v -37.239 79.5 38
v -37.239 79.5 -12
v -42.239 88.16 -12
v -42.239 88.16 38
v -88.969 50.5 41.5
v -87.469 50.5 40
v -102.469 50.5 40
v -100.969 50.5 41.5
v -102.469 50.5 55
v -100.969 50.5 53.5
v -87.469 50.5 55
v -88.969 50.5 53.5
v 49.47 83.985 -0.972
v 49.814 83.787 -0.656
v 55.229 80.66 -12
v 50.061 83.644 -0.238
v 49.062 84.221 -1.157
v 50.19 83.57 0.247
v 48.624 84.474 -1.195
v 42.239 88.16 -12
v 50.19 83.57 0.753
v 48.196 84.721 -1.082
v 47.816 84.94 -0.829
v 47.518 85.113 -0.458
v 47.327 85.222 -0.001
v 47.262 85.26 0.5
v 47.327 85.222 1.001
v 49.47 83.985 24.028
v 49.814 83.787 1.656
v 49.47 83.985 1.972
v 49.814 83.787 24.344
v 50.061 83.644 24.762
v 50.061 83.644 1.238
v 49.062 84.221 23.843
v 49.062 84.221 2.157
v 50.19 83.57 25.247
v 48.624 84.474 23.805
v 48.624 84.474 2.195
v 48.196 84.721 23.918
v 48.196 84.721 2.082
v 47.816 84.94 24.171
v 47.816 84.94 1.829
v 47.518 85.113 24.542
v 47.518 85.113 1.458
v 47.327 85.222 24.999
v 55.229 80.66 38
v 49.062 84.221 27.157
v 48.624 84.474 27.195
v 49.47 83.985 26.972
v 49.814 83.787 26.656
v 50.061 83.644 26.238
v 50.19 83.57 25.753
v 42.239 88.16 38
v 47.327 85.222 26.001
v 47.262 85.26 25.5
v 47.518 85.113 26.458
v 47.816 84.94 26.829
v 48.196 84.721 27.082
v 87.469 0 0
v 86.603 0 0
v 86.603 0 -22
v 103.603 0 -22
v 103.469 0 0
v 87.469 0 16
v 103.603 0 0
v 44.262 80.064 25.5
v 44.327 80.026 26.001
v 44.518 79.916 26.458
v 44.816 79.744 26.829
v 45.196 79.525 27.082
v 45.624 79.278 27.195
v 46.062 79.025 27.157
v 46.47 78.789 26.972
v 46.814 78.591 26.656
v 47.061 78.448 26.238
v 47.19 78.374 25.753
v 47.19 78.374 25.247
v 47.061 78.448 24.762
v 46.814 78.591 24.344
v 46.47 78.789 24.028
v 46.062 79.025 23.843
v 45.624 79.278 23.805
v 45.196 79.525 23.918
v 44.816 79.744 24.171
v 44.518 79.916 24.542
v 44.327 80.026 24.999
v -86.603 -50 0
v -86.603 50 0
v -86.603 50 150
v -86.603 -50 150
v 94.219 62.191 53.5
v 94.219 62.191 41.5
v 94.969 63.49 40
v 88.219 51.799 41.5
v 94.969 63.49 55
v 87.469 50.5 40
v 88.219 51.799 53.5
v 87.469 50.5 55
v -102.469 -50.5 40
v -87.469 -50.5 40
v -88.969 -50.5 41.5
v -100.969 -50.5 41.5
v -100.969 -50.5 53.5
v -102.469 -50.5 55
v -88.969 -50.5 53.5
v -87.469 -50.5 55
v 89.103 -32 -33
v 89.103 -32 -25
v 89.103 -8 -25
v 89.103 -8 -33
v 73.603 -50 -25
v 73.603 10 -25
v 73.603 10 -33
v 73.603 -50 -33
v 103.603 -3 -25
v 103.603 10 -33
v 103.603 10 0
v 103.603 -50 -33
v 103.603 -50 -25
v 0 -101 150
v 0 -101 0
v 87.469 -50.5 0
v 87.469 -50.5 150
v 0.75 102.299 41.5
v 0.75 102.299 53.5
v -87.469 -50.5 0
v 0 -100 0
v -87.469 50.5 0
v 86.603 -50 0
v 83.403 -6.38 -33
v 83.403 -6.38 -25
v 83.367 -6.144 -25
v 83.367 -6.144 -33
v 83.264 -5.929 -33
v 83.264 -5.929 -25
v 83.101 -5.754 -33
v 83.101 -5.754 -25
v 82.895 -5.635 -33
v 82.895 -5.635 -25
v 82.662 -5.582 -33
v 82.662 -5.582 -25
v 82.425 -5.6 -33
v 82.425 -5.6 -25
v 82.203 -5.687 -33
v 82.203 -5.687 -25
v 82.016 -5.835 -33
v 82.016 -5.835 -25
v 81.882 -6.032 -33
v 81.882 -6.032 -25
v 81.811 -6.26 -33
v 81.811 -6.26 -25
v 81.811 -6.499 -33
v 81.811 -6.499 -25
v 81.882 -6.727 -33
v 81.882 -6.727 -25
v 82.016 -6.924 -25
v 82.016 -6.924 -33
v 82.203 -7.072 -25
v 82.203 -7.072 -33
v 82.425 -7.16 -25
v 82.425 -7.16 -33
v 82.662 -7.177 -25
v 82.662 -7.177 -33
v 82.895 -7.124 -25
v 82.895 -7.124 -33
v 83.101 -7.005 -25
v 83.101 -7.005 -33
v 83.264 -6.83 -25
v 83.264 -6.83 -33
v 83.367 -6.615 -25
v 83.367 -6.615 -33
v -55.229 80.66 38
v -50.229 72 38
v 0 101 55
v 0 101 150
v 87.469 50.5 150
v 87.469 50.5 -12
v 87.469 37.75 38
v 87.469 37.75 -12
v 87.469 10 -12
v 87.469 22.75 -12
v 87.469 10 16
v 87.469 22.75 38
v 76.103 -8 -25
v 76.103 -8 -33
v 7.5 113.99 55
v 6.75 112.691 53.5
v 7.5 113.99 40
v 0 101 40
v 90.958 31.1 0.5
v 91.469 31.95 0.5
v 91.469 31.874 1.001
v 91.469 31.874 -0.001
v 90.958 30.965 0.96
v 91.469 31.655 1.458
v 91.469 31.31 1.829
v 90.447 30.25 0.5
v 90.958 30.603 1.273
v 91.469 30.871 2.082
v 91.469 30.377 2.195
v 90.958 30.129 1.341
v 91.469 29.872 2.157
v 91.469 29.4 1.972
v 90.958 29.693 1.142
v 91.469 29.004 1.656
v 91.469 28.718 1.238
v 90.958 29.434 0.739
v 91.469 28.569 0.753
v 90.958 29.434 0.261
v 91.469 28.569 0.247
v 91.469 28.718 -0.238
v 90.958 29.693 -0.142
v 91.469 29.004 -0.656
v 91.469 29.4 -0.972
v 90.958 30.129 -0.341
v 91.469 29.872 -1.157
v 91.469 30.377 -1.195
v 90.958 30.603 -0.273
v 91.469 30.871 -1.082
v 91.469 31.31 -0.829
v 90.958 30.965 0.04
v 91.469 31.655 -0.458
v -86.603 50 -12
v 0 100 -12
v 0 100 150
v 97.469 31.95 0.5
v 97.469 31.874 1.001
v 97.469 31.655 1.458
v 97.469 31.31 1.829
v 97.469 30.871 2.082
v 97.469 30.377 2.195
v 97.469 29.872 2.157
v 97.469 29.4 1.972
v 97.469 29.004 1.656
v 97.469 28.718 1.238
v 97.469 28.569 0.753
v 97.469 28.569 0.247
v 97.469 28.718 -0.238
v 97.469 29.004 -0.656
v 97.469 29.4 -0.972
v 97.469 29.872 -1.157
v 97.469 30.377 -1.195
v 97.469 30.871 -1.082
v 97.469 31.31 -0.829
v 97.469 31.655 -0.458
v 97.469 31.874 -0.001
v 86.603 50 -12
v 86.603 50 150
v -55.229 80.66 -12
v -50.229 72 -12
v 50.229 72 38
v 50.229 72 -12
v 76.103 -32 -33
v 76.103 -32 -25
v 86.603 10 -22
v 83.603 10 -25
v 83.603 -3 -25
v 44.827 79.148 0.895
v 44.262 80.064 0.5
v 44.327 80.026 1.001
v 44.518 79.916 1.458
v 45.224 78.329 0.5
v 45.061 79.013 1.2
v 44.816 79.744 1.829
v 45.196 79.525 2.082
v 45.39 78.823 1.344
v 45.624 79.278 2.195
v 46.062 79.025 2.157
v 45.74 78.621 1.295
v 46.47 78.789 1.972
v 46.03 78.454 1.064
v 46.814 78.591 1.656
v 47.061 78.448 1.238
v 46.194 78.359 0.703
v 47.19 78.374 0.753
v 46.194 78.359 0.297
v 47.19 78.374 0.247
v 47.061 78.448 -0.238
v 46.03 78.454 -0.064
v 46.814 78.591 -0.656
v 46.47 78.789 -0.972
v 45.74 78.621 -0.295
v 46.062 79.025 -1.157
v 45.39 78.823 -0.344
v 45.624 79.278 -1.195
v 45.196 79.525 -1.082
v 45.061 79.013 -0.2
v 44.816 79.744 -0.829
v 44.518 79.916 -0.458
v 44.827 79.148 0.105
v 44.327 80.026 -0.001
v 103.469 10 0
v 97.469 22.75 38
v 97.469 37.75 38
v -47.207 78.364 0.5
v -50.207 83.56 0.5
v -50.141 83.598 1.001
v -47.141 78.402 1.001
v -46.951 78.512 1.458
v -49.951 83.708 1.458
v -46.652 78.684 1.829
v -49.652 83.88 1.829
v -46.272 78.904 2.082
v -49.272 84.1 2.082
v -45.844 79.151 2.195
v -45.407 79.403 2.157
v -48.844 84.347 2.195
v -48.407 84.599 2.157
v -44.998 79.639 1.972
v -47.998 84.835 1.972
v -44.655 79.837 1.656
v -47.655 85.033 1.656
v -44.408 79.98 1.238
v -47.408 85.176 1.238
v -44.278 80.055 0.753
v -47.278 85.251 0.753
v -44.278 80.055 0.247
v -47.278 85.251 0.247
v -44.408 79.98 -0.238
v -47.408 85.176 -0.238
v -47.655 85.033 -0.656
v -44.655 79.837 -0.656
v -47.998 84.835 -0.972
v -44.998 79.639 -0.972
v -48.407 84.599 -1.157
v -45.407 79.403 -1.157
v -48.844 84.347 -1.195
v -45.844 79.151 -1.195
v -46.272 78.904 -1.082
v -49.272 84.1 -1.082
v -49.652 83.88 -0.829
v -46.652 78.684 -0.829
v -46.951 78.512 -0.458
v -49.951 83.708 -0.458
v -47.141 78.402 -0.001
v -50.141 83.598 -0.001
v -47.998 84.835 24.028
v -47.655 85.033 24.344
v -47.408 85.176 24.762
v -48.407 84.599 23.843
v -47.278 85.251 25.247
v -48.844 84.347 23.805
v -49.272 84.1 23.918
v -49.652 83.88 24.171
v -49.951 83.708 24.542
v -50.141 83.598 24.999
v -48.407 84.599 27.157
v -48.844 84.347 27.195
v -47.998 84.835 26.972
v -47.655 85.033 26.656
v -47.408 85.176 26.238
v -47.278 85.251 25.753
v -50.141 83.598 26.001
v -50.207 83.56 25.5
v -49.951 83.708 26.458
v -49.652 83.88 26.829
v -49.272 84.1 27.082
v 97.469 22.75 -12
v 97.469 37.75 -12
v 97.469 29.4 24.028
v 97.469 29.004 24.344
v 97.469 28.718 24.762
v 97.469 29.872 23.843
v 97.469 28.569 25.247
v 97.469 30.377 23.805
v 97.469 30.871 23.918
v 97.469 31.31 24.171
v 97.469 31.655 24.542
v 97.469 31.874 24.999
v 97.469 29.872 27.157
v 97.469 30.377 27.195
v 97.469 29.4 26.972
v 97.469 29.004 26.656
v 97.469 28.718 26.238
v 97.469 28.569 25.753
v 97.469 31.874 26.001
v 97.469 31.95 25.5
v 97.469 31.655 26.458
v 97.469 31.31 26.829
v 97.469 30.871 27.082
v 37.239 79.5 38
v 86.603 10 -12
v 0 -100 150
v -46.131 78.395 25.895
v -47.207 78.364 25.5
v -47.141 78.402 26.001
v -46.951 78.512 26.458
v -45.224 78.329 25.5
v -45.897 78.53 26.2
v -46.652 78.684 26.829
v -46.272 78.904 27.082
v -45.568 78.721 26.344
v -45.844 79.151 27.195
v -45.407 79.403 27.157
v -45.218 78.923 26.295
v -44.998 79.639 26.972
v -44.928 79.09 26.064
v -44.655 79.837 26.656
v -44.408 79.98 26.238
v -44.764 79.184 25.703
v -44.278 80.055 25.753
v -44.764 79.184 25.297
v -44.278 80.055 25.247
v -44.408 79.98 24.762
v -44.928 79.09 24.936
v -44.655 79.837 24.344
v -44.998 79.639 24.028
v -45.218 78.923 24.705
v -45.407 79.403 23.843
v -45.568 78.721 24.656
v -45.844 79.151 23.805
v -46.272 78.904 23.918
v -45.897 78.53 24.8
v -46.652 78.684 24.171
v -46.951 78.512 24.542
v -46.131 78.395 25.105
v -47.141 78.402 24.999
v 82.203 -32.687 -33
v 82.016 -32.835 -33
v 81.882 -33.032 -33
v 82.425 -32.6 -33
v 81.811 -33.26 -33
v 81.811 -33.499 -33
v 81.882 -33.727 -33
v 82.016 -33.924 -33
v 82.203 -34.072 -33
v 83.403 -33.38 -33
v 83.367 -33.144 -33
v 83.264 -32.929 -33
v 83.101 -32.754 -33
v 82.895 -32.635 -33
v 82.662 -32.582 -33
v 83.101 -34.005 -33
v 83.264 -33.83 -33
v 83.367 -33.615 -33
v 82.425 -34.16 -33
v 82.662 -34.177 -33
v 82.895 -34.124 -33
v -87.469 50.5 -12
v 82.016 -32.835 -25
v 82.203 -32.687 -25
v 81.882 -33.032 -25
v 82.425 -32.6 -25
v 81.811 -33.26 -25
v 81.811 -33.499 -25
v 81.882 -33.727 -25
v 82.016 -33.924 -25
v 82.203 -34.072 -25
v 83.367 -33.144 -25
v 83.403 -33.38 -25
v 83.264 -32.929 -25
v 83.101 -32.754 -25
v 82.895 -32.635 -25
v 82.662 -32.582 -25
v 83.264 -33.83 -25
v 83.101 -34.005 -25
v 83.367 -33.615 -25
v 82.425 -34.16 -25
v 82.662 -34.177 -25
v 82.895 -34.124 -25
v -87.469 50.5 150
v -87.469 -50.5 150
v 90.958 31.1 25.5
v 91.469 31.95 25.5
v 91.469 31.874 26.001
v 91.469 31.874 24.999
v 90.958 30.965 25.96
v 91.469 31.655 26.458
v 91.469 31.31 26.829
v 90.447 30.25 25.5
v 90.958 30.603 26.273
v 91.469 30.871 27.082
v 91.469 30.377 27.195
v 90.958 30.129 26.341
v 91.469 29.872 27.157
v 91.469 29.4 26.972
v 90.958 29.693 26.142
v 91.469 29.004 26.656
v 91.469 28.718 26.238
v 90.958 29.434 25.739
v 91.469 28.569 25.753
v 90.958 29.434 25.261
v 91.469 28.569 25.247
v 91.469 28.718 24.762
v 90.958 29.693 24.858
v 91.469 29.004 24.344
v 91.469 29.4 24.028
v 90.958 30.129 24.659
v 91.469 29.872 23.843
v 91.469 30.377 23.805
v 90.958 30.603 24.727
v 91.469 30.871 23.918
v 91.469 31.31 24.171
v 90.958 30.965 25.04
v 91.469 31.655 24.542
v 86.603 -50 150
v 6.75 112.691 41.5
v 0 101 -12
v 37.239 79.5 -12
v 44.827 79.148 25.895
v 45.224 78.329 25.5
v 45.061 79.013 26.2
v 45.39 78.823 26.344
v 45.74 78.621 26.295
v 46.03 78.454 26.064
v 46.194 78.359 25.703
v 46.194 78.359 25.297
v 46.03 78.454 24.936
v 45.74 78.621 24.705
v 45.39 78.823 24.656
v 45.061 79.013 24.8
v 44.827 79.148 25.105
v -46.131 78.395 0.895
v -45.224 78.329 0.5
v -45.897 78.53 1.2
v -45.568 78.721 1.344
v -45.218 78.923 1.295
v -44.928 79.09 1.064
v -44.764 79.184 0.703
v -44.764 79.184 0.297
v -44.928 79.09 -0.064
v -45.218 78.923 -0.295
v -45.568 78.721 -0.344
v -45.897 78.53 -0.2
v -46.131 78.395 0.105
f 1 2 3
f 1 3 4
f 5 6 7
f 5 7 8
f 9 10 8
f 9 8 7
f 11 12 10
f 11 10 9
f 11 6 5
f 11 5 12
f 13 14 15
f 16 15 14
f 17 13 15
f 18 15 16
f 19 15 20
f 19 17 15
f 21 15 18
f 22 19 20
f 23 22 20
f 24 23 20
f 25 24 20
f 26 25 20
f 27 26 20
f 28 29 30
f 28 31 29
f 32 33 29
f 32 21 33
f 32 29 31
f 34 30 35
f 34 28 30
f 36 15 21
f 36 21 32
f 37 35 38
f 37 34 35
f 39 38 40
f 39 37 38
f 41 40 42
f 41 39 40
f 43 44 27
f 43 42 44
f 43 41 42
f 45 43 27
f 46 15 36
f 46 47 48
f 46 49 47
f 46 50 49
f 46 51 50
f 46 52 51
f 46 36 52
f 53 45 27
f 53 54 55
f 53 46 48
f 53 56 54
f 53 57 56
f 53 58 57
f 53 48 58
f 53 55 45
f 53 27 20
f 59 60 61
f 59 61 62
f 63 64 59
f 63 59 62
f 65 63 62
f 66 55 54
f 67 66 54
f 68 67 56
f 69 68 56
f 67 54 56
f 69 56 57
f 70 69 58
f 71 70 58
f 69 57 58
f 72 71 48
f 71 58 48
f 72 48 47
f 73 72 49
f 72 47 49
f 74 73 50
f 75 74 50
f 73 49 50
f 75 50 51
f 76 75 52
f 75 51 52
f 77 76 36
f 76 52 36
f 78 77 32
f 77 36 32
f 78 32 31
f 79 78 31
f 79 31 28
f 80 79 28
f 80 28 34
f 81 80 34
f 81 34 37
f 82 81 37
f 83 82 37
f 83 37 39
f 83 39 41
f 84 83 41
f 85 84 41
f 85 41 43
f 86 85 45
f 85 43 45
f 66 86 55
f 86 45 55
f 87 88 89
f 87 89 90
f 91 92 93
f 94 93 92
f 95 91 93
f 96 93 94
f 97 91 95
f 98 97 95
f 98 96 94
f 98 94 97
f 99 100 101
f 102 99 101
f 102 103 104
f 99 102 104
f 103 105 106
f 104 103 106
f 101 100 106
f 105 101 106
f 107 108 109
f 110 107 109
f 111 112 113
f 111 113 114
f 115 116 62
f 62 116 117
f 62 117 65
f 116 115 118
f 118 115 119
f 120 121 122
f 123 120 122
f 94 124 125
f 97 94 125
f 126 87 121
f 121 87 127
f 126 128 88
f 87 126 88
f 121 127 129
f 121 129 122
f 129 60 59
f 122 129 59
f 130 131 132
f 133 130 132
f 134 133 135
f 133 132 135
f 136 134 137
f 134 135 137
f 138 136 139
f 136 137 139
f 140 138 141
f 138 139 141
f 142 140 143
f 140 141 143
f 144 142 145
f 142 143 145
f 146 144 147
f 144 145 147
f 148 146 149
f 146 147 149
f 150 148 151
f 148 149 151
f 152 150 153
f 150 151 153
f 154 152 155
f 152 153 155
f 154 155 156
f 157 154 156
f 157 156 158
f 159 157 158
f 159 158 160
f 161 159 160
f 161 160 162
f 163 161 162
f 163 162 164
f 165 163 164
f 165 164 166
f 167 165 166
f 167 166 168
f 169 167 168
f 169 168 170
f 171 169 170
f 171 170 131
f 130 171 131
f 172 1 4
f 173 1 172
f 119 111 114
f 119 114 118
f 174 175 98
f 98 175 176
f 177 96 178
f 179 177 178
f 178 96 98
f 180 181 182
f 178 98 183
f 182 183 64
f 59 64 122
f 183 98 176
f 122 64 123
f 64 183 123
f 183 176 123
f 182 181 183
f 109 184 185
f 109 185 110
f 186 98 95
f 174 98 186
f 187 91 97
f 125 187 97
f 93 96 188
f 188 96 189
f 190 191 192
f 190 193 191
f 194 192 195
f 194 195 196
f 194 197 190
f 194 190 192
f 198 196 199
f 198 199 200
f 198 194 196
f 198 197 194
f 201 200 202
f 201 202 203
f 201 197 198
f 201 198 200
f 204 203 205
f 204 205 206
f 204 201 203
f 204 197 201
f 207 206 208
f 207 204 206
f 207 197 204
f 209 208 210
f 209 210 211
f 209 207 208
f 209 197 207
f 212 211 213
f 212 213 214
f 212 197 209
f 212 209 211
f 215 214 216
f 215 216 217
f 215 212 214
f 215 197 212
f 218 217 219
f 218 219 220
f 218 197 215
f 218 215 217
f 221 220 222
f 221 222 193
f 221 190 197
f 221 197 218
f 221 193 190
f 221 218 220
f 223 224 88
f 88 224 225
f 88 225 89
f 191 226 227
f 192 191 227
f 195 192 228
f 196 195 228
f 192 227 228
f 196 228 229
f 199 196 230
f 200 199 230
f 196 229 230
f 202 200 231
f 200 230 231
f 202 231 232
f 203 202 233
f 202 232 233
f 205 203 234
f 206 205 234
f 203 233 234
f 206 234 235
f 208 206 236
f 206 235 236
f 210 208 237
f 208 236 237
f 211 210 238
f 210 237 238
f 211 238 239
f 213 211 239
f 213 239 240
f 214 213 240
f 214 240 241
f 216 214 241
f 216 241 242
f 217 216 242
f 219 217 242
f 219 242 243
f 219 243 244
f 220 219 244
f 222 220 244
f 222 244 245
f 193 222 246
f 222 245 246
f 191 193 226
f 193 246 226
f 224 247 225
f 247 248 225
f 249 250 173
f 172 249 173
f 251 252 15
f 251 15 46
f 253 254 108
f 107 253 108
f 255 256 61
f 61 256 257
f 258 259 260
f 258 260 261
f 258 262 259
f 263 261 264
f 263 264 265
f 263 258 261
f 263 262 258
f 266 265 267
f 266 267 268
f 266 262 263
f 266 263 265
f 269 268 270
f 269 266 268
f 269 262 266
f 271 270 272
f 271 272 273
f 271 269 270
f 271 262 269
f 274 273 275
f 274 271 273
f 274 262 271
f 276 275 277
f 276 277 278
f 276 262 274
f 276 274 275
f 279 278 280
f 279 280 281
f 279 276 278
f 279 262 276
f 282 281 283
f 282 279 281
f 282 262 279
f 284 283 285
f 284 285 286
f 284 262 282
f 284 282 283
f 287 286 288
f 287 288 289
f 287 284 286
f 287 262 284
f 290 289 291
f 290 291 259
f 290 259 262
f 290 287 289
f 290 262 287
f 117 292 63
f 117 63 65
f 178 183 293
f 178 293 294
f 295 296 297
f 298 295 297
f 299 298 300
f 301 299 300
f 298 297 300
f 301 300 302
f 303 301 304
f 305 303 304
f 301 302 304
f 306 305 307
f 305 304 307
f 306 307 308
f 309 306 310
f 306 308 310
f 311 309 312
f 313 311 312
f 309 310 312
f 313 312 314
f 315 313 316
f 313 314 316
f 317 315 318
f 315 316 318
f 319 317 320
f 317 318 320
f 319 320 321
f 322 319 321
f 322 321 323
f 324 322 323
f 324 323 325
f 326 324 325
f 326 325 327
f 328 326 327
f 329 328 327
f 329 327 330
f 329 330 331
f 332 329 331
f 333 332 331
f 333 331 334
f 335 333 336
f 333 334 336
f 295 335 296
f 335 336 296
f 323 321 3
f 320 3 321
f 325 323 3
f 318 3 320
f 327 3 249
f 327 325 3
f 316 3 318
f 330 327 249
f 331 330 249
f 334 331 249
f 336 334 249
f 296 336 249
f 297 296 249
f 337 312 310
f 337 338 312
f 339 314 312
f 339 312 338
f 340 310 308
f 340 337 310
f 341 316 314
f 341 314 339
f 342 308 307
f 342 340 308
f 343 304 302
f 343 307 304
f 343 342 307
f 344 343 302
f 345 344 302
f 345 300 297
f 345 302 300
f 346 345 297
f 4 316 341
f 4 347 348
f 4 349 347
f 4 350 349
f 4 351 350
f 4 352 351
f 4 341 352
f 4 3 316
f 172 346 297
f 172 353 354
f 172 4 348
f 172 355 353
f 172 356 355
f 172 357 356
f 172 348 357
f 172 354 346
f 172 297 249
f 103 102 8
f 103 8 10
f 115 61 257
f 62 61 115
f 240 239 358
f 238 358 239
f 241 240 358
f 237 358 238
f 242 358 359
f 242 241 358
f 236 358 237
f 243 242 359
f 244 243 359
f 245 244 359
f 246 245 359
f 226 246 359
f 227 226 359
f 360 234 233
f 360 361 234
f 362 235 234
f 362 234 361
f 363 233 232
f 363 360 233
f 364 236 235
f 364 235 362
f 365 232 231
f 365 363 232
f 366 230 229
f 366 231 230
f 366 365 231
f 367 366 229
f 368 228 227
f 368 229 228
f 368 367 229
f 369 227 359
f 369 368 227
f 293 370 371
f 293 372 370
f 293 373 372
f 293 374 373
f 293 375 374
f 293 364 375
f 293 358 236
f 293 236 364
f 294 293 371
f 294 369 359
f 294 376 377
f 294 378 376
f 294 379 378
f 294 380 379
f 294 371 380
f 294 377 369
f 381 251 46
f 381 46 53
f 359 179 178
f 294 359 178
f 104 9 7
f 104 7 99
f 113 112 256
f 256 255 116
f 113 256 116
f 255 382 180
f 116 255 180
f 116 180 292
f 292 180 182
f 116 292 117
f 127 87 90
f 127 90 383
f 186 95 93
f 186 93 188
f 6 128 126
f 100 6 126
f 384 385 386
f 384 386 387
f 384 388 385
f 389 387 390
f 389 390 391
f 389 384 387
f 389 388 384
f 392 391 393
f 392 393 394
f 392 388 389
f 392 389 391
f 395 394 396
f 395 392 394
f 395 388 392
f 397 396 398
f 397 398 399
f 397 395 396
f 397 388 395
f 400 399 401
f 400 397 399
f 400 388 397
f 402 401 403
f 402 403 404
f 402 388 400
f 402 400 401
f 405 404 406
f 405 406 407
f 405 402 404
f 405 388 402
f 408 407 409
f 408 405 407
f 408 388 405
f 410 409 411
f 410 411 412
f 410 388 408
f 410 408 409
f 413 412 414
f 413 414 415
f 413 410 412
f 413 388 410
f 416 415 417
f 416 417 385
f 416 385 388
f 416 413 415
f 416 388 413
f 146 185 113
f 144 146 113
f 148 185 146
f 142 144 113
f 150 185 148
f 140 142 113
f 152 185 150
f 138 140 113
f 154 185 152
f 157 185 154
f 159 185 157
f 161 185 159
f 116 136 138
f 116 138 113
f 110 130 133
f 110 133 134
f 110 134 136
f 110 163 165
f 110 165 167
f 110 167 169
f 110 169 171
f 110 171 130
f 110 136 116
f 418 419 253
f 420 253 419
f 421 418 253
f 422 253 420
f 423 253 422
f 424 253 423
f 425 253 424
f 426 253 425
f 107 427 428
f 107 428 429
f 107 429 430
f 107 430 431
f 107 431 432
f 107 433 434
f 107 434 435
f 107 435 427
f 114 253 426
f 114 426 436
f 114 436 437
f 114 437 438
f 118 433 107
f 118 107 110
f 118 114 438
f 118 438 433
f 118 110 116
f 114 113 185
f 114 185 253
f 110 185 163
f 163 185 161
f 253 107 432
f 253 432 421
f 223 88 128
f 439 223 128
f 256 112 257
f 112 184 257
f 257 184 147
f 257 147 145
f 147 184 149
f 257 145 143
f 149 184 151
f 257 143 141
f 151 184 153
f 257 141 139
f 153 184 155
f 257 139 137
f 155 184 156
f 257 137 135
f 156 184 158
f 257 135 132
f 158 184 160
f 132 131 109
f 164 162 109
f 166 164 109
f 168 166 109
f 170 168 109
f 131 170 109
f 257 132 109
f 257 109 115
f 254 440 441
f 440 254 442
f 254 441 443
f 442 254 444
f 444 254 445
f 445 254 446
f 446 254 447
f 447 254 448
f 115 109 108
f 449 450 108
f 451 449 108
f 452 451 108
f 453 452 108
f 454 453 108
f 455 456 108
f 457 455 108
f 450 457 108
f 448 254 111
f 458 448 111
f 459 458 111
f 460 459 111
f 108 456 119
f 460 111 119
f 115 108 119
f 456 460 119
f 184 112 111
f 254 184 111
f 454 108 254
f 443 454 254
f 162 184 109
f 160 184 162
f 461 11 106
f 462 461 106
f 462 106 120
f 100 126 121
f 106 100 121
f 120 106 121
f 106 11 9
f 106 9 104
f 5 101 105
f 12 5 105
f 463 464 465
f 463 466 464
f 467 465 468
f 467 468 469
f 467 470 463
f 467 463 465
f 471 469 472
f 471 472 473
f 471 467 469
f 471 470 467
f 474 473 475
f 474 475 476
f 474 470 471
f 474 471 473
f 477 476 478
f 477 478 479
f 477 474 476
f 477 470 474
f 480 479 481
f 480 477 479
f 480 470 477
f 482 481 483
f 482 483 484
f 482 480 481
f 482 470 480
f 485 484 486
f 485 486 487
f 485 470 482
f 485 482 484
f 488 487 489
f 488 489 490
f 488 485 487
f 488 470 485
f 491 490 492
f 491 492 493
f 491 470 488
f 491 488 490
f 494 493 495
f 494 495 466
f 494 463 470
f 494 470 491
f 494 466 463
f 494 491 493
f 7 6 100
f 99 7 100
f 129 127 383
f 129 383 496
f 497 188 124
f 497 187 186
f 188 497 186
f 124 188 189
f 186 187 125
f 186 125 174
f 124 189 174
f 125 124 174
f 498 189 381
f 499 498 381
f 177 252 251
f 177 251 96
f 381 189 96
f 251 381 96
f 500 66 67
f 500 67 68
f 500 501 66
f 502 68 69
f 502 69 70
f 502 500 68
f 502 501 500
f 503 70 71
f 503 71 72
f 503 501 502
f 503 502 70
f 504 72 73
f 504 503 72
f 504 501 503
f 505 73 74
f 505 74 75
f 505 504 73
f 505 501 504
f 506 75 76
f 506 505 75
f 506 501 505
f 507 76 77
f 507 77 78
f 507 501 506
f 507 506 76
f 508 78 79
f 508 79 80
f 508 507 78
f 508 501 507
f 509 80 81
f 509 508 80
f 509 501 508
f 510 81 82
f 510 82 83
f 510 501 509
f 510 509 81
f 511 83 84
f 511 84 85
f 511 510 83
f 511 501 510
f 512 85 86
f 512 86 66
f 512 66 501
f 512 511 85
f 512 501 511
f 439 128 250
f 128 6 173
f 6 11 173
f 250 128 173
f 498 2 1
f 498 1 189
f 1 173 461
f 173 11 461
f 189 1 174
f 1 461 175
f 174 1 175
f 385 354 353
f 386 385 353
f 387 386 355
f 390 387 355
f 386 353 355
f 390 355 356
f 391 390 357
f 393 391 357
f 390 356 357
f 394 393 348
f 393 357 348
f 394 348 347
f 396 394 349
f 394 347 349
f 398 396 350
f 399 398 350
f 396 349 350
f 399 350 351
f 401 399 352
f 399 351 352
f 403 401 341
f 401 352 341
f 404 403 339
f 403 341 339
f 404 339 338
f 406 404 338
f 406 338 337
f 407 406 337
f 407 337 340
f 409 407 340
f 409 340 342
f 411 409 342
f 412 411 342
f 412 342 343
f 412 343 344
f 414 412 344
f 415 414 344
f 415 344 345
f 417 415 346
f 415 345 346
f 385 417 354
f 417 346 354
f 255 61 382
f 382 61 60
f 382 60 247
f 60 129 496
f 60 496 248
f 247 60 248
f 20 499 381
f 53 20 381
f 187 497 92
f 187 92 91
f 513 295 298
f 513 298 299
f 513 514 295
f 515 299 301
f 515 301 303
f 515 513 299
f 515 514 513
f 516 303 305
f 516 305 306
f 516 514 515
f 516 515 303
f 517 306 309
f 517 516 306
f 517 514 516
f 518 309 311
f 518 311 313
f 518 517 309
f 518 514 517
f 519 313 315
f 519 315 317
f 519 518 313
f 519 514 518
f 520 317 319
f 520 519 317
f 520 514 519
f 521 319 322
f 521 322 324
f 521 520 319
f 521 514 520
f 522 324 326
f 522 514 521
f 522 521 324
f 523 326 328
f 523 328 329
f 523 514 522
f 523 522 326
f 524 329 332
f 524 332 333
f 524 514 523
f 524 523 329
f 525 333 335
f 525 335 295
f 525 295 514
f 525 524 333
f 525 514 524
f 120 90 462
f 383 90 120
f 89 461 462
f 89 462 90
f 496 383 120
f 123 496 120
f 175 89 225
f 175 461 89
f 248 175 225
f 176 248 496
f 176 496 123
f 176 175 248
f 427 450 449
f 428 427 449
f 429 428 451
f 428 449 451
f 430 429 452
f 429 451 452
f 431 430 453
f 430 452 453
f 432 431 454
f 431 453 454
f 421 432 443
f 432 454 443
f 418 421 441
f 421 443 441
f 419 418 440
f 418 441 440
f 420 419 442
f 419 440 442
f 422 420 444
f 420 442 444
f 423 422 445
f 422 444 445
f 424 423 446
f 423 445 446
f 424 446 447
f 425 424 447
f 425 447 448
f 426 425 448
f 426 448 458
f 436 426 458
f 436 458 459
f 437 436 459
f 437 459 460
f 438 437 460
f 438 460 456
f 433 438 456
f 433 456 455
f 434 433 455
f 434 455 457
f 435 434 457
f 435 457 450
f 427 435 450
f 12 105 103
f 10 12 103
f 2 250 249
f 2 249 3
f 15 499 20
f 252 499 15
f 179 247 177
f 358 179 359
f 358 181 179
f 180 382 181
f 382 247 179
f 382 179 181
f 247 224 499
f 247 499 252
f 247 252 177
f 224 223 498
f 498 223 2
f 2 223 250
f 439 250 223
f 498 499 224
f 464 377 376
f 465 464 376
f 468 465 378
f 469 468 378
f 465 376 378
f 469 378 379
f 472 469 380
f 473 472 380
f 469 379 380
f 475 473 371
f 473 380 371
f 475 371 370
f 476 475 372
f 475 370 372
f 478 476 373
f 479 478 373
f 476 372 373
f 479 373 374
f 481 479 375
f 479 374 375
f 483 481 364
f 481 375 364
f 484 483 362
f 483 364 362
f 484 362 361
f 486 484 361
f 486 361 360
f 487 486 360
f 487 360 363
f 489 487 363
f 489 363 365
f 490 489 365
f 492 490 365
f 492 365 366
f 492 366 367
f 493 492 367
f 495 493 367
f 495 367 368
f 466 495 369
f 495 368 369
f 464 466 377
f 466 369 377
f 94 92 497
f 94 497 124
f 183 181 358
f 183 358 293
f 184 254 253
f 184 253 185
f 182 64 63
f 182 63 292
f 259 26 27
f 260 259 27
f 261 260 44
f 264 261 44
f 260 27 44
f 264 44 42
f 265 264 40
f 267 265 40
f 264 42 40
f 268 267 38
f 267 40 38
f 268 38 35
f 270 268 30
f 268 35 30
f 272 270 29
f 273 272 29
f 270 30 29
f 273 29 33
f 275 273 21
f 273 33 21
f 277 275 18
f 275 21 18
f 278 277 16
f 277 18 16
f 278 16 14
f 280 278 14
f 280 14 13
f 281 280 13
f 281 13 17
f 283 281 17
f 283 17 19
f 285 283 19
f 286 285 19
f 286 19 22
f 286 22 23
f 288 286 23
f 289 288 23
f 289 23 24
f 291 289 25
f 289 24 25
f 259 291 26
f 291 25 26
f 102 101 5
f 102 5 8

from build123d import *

# Parameters (mm, degrees)
PAD_DEPTH       = 150
SKETCH001_W     = 17
SKETCH001_H     = 10
PAD001_DEPTH    = 25
SKETCH002_W     = 30
SKETCH002_H     = 60
PAD002_DEPTH    = 8
SKETCH003_W     = 13
SKETCH003_H     = 24
POCKET_DEPTH    = 8.001
SKETCH004_R     = 0.8
HOLE_DEPTH      = 25
CHAMFER_SIZE    = 16
CHAMFER001_SIZE = 3
PAD003_DEPTH    = 12
SKETCH006_W     = 15
SKETCH006_H     = 50
PAD004_DEPTH    = 10
SKETCH007_R     = 1.7
HOLE001_DEPTH   = 6
HOLE001_TIPS_R  = 1.7
SKETCH008_W     = 15
SKETCH008_H     = 50
PAD005_DEPTH    = 10
SKETCH009_R     = 1.7
HOLE002_DEPTH   = 6
HOLE002_TIPS_R  = 1.7
SKETCH010_W     = 15
SKETCH010_H     = 50
PAD006_DEPTH    = 10
SKETCH011_R     = 1.7
HOLE003_DEPTH   = 6
HOLE003_TIPS_R  = 1.7
SKETCH012_W     = 101
SKETCH012_H     = 15
PAD007_DEPTH    = 15
SKETCH013_W     = 12
SKETCH013_H     = 12
POCKET001_DEPTH = 151.501
SKETCH014_W     = 101
SKETCH014_H     = 15
PAD008_DEPTH    = 15
SKETCH015_W     = 12
SKETCH015_H     = 12
POCKET002_DEPTH = 190.7234318643


with BuildPart() as part:
    # Sketch → Pad (new body)
    with BuildSketch(Plane.XY):
        Polygon((87.4685657822, -50.5), (87.4685657822, 50.5), (0, 101), (-87.4685657822, 50.5), (-87.4685657822, -50.5), (0, -101), align=None)
        Polygon((86.6025403784, 50), (0, 100), (-86.6025403784, 50), (-86.6025403784, -50), (0, -100), (86.6025403784, -50), align=None, mode=Mode.SUBTRACT)
    extrude(amount=PAD_DEPTH)

    # Sketch001 (on Face13 of Pad) → Pad001 (join)
    with BuildSketch(Plane(origin=(0, 0, 0), x_dir=(1, 0, 0), z_dir=(0, 0, -1))):
        with Locations((95.1025403784, -5)):
            Rectangle(SKETCH001_W, SKETCH001_H)
    extrude(amount=PAD001_DEPTH)

    # Sketch002 (on Face20 of Pad001) → Pad002 (join)
    with BuildSketch(Plane(origin=(0, 0, -25), x_dir=(1, 0, 0), z_dir=(0, 0, -1))):
        with Locations((88.6025403784, 20)):
            Rectangle(SKETCH002_W, SKETCH002_H)
    extrude(amount=PAD002_DEPTH)

    # Sketch003 (on Face21 of Pad002) → Pocket (cut, through all)
    with BuildSketch(Plane.XY.offset(-25)):
        with Locations((82.6025403784, -20)):
            Rectangle(SKETCH003_W, SKETCH003_H)
    extrude(amount=-POCKET_DEPTH, mode=Mode.SUBTRACT)

    # Sketch004 (on Face21 of Pocket) → Hole (cut)
    with BuildSketch(Plane.XY.offset(-25)):
        with Locations((82.6025403784, -6.379604)):
            Circle(SKETCH004_R)
        with Locations((82.6025403784, -33.379604)):
            Circle(SKETCH004_R)
    extrude(amount=-HOLE_DEPTH, mode=Mode.SUBTRACT)

    # Chamfer
    chamfer_edges = [part.edges().sort_by_distance(p)[0] for p in [
        (87.468566, 5, 0),
    ]]
    chamfer(chamfer_edges, length=CHAMFER_SIZE)

    # Chamfer001
    chamfer001_edges = [part.edges().sort_by_distance(p)[0] for p in [
        (95.10254, 0, -25),
        (86.60254, 5, -25),
    ]]
    chamfer(chamfer001_edges, length=CHAMFER001_SIZE)

    # Sketch005 (on Face7 of Chamfer001) → Pad003 (join)
    with BuildSketch(Plane(origin=(0, 0, 0), x_dir=(1, 0, 0), z_dir=(0, 0, -1))):
        Polygon((86.6025403784, -10), (86.6025403784, -50), (0, -100), (-86.6025403784, -50), (-87.4685657822, -50.5), (0, -101), (87.4685657822, -50.5), (87.4685657822, -10), align=None)
    extrude(amount=PAD003_DEPTH)

    # Sketch006 (on Face23 of Pad003) → Pad004 (join)
    with BuildSketch(Plane.YZ.offset(87.4685657822)):
        with Locations((30.25, 13)):
            Rectangle(SKETCH006_W, SKETCH006_H)
    extrude(amount=PAD004_DEPTH)

    # Sketch007 (on Face47 of Pad004) → Hole001 (cut)
    with BuildSketch(Plane.YZ.offset(97.4685657822)):
        with Locations((30.25, 25.5)):
            Circle(SKETCH007_R)
        with Locations((30.25, 0.5)):
            Circle(SKETCH007_R)
    extrude(amount=-HOLE001_DEPTH, mode=Mode.SUBTRACT)

    # Hole001 tips → Hole001 tip 1 section 0
    with BuildSketch(Plane.YZ.offset(91.4685657822), mode=Mode.PRIVATE) as hole001_tip_1_s0:
        with Locations((30.25, 25.5)):
            Circle(HOLE001_TIPS_R)
    loft([hole001_tip_1_s0.sketch, Vertex(90.4471027299, 30.25, 25.5)], mode=Mode.SUBTRACT)

    # Hole001 tips → Hole001 tip 2 section 0
    with BuildSketch(Plane.YZ.offset(91.4685657822), mode=Mode.PRIVATE) as hole001_tip_2_s0:
        with Locations((30.25, 0.5)):
            Circle(HOLE001_TIPS_R)
    loft([hole001_tip_2_s0.sketch, Vertex(90.4471027299, 30.25, 0.5)], mode=Mode.SUBTRACT)

    # Sketch008 (on Face48 of Hole001) → Pad005 (join)
    with BuildSketch(Plane(origin=(43.7342828911, 75.75, 0), x_dir=(-0.8660254038, 0.5, 0), z_dir=(0.5, 0.8660254038, 0))):
        with Locations((0, 13)):
            Rectangle(SKETCH008_W, SKETCH008_H)
    extrude(amount=PAD005_DEPTH)

    # Sketch009 (on Face56 of Pad005) → Hole002 (cut)
    with BuildSketch(Plane(origin=(48.7342828911, 84.4102540378, 0), x_dir=(-0.8660254038, 0.5, 0), z_dir=(0.5, 0.8660254038, 0))):
        with Locations((0, 25.5)):
            Circle(SKETCH009_R)
        with Locations((0, 0.5)):
            Circle(SKETCH009_R)
    extrude(amount=-HOLE002_DEPTH, mode=Mode.SUBTRACT)

    # Hole002 tips → Hole002 tip 1 section 0
    with BuildSketch(Plane(origin=(45.7342828911, 79.2141016151, 0), x_dir=(-0.8660254038, 0.5, 0), z_dir=(0.5, 0.8660254038, 0)), mode=Mode.PRIVATE) as hole002_tip_1_s0:
        with Locations((0, 25.5)):
            Circle(HOLE002_TIPS_R)
    loft([hole002_tip_1_s0.sketch, Vertex(45.2235513649, 78.3294886628, 25.5)], mode=Mode.SUBTRACT)

    # Hole002 tips → Hole002 tip 2 section 0
    with BuildSketch(Plane(origin=(45.7342828911, 79.2141016151, 0), x_dir=(-0.8660254038, 0.5, 0), z_dir=(0.5, 0.8660254038, 0)), mode=Mode.PRIVATE) as hole002_tip_2_s0:
        with Locations((0, 0.5)):
            Circle(HOLE002_TIPS_R)
    loft([hole002_tip_2_s0.sketch, Vertex(45.2235513649, 78.3294886628, 0.5)], mode=Mode.SUBTRACT)

    # Sketch010 (on Face44 of Hole002) → Pad006 (join)
    with BuildSketch(Plane(origin=(-43.7342828911, 75.75, 0), x_dir=(-0.8660254038, -0.5, 0), z_dir=(-0.5, 0.8660254038, 0))):
        with Locations((0, 13)):
            Rectangle(SKETCH010_W, SKETCH010_H)
    extrude(amount=PAD006_DEPTH)

    # Sketch011 (on Face62 of Pad006) → Hole003 (cut)
    with BuildSketch(Plane(origin=(-48.7342828911, 84.4102540378, 0), x_dir=(-0.8660254038, -0.5, 0), z_dir=(-0.5, 0.8660254038, 0))):
        with Locations((0, 25.5)):
            Circle(SKETCH011_R)
        with Locations((0, 0.5)):
            Circle(SKETCH011_R)
    extrude(amount=-HOLE003_DEPTH, mode=Mode.SUBTRACT)

    # Hole003 tips → Hole003 tip 1 section 0
    with BuildSketch(Plane(origin=(-45.7342828911, 79.2141016151, 0), x_dir=(-0.8660254038, -0.5, 0), z_dir=(-0.5, 0.8660254038, 0)), mode=Mode.PRIVATE) as hole003_tip_1_s0:
        with Locations((0, 25.5)):
            Circle(HOLE003_TIPS_R)
    loft([hole003_tip_1_s0.sketch, Vertex(-45.2235513649, 78.3294886628, 25.5)], mode=Mode.SUBTRACT)

    # Hole003 tips → Hole003 tip 2 section 0
    with BuildSketch(Plane(origin=(-45.7342828911, 79.2141016151, 0), x_dir=(-0.8660254038, -0.5, 0), z_dir=(-0.5, 0.8660254038, 0)), mode=Mode.PRIVATE) as hole003_tip_2_s0:
        with Locations((0, 0.5)):
            Circle(HOLE003_TIPS_R)
    loft([hole003_tip_2_s0.sketch, Vertex(-45.2235513649, 78.3294886628, 0.5)], mode=Mode.SUBTRACT)

    # Sketch012 (on Face16 of Hole003) → Pad007 (join)
    with BuildSketch(Plane(origin=(-87.4685657822, 0, 0), x_dir=(0, -1, 0), z_dir=(-1, 0, 0))):
        with Locations((0, 47.5)):
            Rectangle(SKETCH012_W, SKETCH012_H)
    extrude(amount=PAD007_DEPTH)

    # Sketch013 (on Face61 of Pad007) → Pocket001 (cut, through all)
    with BuildSketch(Plane(origin=(0, 50.5, 0), x_dir=(-1, 0, 0), z_dir=(0, 1, 0))):
        with Locations((94.9685657822, 47.5)):
            Rectangle(SKETCH013_W, SKETCH013_H)
    extrude(amount=-POCKET001_DEPTH, mode=Mode.SUBTRACT)

    # Sketch014 (on Face27 of Pocket001) → Pad008 (join)
    with BuildSketch(Plane(origin=(43.7342828911, 75.75, 0), x_dir=(-0.8660254038, 0.5, 0), z_dir=(0.5, 0.8660254038, 0))):
        with Locations((0, 47.5)):
            Rectangle(SKETCH014_W, SKETCH014_H)
    extrude(amount=PAD008_DEPTH)

    # Sketch015 (on Face49 of Pad008) → Pocket002 (cut, through all)
    with BuildSketch(Plane(origin=(-43.7342828911, 25.25, 0), x_dir=(-0.5, -0.8660254038, 0), z_dir=(-0.8660254038, 0.5, 0))):
        with Locations((-94.9685657822, 47.5)):
            Rectangle(SKETCH015_W, SKETCH015_H)
    extrude(amount=-POCKET002_DEPTH, mode=Mode.SUBTRACT)


solid = part.part
